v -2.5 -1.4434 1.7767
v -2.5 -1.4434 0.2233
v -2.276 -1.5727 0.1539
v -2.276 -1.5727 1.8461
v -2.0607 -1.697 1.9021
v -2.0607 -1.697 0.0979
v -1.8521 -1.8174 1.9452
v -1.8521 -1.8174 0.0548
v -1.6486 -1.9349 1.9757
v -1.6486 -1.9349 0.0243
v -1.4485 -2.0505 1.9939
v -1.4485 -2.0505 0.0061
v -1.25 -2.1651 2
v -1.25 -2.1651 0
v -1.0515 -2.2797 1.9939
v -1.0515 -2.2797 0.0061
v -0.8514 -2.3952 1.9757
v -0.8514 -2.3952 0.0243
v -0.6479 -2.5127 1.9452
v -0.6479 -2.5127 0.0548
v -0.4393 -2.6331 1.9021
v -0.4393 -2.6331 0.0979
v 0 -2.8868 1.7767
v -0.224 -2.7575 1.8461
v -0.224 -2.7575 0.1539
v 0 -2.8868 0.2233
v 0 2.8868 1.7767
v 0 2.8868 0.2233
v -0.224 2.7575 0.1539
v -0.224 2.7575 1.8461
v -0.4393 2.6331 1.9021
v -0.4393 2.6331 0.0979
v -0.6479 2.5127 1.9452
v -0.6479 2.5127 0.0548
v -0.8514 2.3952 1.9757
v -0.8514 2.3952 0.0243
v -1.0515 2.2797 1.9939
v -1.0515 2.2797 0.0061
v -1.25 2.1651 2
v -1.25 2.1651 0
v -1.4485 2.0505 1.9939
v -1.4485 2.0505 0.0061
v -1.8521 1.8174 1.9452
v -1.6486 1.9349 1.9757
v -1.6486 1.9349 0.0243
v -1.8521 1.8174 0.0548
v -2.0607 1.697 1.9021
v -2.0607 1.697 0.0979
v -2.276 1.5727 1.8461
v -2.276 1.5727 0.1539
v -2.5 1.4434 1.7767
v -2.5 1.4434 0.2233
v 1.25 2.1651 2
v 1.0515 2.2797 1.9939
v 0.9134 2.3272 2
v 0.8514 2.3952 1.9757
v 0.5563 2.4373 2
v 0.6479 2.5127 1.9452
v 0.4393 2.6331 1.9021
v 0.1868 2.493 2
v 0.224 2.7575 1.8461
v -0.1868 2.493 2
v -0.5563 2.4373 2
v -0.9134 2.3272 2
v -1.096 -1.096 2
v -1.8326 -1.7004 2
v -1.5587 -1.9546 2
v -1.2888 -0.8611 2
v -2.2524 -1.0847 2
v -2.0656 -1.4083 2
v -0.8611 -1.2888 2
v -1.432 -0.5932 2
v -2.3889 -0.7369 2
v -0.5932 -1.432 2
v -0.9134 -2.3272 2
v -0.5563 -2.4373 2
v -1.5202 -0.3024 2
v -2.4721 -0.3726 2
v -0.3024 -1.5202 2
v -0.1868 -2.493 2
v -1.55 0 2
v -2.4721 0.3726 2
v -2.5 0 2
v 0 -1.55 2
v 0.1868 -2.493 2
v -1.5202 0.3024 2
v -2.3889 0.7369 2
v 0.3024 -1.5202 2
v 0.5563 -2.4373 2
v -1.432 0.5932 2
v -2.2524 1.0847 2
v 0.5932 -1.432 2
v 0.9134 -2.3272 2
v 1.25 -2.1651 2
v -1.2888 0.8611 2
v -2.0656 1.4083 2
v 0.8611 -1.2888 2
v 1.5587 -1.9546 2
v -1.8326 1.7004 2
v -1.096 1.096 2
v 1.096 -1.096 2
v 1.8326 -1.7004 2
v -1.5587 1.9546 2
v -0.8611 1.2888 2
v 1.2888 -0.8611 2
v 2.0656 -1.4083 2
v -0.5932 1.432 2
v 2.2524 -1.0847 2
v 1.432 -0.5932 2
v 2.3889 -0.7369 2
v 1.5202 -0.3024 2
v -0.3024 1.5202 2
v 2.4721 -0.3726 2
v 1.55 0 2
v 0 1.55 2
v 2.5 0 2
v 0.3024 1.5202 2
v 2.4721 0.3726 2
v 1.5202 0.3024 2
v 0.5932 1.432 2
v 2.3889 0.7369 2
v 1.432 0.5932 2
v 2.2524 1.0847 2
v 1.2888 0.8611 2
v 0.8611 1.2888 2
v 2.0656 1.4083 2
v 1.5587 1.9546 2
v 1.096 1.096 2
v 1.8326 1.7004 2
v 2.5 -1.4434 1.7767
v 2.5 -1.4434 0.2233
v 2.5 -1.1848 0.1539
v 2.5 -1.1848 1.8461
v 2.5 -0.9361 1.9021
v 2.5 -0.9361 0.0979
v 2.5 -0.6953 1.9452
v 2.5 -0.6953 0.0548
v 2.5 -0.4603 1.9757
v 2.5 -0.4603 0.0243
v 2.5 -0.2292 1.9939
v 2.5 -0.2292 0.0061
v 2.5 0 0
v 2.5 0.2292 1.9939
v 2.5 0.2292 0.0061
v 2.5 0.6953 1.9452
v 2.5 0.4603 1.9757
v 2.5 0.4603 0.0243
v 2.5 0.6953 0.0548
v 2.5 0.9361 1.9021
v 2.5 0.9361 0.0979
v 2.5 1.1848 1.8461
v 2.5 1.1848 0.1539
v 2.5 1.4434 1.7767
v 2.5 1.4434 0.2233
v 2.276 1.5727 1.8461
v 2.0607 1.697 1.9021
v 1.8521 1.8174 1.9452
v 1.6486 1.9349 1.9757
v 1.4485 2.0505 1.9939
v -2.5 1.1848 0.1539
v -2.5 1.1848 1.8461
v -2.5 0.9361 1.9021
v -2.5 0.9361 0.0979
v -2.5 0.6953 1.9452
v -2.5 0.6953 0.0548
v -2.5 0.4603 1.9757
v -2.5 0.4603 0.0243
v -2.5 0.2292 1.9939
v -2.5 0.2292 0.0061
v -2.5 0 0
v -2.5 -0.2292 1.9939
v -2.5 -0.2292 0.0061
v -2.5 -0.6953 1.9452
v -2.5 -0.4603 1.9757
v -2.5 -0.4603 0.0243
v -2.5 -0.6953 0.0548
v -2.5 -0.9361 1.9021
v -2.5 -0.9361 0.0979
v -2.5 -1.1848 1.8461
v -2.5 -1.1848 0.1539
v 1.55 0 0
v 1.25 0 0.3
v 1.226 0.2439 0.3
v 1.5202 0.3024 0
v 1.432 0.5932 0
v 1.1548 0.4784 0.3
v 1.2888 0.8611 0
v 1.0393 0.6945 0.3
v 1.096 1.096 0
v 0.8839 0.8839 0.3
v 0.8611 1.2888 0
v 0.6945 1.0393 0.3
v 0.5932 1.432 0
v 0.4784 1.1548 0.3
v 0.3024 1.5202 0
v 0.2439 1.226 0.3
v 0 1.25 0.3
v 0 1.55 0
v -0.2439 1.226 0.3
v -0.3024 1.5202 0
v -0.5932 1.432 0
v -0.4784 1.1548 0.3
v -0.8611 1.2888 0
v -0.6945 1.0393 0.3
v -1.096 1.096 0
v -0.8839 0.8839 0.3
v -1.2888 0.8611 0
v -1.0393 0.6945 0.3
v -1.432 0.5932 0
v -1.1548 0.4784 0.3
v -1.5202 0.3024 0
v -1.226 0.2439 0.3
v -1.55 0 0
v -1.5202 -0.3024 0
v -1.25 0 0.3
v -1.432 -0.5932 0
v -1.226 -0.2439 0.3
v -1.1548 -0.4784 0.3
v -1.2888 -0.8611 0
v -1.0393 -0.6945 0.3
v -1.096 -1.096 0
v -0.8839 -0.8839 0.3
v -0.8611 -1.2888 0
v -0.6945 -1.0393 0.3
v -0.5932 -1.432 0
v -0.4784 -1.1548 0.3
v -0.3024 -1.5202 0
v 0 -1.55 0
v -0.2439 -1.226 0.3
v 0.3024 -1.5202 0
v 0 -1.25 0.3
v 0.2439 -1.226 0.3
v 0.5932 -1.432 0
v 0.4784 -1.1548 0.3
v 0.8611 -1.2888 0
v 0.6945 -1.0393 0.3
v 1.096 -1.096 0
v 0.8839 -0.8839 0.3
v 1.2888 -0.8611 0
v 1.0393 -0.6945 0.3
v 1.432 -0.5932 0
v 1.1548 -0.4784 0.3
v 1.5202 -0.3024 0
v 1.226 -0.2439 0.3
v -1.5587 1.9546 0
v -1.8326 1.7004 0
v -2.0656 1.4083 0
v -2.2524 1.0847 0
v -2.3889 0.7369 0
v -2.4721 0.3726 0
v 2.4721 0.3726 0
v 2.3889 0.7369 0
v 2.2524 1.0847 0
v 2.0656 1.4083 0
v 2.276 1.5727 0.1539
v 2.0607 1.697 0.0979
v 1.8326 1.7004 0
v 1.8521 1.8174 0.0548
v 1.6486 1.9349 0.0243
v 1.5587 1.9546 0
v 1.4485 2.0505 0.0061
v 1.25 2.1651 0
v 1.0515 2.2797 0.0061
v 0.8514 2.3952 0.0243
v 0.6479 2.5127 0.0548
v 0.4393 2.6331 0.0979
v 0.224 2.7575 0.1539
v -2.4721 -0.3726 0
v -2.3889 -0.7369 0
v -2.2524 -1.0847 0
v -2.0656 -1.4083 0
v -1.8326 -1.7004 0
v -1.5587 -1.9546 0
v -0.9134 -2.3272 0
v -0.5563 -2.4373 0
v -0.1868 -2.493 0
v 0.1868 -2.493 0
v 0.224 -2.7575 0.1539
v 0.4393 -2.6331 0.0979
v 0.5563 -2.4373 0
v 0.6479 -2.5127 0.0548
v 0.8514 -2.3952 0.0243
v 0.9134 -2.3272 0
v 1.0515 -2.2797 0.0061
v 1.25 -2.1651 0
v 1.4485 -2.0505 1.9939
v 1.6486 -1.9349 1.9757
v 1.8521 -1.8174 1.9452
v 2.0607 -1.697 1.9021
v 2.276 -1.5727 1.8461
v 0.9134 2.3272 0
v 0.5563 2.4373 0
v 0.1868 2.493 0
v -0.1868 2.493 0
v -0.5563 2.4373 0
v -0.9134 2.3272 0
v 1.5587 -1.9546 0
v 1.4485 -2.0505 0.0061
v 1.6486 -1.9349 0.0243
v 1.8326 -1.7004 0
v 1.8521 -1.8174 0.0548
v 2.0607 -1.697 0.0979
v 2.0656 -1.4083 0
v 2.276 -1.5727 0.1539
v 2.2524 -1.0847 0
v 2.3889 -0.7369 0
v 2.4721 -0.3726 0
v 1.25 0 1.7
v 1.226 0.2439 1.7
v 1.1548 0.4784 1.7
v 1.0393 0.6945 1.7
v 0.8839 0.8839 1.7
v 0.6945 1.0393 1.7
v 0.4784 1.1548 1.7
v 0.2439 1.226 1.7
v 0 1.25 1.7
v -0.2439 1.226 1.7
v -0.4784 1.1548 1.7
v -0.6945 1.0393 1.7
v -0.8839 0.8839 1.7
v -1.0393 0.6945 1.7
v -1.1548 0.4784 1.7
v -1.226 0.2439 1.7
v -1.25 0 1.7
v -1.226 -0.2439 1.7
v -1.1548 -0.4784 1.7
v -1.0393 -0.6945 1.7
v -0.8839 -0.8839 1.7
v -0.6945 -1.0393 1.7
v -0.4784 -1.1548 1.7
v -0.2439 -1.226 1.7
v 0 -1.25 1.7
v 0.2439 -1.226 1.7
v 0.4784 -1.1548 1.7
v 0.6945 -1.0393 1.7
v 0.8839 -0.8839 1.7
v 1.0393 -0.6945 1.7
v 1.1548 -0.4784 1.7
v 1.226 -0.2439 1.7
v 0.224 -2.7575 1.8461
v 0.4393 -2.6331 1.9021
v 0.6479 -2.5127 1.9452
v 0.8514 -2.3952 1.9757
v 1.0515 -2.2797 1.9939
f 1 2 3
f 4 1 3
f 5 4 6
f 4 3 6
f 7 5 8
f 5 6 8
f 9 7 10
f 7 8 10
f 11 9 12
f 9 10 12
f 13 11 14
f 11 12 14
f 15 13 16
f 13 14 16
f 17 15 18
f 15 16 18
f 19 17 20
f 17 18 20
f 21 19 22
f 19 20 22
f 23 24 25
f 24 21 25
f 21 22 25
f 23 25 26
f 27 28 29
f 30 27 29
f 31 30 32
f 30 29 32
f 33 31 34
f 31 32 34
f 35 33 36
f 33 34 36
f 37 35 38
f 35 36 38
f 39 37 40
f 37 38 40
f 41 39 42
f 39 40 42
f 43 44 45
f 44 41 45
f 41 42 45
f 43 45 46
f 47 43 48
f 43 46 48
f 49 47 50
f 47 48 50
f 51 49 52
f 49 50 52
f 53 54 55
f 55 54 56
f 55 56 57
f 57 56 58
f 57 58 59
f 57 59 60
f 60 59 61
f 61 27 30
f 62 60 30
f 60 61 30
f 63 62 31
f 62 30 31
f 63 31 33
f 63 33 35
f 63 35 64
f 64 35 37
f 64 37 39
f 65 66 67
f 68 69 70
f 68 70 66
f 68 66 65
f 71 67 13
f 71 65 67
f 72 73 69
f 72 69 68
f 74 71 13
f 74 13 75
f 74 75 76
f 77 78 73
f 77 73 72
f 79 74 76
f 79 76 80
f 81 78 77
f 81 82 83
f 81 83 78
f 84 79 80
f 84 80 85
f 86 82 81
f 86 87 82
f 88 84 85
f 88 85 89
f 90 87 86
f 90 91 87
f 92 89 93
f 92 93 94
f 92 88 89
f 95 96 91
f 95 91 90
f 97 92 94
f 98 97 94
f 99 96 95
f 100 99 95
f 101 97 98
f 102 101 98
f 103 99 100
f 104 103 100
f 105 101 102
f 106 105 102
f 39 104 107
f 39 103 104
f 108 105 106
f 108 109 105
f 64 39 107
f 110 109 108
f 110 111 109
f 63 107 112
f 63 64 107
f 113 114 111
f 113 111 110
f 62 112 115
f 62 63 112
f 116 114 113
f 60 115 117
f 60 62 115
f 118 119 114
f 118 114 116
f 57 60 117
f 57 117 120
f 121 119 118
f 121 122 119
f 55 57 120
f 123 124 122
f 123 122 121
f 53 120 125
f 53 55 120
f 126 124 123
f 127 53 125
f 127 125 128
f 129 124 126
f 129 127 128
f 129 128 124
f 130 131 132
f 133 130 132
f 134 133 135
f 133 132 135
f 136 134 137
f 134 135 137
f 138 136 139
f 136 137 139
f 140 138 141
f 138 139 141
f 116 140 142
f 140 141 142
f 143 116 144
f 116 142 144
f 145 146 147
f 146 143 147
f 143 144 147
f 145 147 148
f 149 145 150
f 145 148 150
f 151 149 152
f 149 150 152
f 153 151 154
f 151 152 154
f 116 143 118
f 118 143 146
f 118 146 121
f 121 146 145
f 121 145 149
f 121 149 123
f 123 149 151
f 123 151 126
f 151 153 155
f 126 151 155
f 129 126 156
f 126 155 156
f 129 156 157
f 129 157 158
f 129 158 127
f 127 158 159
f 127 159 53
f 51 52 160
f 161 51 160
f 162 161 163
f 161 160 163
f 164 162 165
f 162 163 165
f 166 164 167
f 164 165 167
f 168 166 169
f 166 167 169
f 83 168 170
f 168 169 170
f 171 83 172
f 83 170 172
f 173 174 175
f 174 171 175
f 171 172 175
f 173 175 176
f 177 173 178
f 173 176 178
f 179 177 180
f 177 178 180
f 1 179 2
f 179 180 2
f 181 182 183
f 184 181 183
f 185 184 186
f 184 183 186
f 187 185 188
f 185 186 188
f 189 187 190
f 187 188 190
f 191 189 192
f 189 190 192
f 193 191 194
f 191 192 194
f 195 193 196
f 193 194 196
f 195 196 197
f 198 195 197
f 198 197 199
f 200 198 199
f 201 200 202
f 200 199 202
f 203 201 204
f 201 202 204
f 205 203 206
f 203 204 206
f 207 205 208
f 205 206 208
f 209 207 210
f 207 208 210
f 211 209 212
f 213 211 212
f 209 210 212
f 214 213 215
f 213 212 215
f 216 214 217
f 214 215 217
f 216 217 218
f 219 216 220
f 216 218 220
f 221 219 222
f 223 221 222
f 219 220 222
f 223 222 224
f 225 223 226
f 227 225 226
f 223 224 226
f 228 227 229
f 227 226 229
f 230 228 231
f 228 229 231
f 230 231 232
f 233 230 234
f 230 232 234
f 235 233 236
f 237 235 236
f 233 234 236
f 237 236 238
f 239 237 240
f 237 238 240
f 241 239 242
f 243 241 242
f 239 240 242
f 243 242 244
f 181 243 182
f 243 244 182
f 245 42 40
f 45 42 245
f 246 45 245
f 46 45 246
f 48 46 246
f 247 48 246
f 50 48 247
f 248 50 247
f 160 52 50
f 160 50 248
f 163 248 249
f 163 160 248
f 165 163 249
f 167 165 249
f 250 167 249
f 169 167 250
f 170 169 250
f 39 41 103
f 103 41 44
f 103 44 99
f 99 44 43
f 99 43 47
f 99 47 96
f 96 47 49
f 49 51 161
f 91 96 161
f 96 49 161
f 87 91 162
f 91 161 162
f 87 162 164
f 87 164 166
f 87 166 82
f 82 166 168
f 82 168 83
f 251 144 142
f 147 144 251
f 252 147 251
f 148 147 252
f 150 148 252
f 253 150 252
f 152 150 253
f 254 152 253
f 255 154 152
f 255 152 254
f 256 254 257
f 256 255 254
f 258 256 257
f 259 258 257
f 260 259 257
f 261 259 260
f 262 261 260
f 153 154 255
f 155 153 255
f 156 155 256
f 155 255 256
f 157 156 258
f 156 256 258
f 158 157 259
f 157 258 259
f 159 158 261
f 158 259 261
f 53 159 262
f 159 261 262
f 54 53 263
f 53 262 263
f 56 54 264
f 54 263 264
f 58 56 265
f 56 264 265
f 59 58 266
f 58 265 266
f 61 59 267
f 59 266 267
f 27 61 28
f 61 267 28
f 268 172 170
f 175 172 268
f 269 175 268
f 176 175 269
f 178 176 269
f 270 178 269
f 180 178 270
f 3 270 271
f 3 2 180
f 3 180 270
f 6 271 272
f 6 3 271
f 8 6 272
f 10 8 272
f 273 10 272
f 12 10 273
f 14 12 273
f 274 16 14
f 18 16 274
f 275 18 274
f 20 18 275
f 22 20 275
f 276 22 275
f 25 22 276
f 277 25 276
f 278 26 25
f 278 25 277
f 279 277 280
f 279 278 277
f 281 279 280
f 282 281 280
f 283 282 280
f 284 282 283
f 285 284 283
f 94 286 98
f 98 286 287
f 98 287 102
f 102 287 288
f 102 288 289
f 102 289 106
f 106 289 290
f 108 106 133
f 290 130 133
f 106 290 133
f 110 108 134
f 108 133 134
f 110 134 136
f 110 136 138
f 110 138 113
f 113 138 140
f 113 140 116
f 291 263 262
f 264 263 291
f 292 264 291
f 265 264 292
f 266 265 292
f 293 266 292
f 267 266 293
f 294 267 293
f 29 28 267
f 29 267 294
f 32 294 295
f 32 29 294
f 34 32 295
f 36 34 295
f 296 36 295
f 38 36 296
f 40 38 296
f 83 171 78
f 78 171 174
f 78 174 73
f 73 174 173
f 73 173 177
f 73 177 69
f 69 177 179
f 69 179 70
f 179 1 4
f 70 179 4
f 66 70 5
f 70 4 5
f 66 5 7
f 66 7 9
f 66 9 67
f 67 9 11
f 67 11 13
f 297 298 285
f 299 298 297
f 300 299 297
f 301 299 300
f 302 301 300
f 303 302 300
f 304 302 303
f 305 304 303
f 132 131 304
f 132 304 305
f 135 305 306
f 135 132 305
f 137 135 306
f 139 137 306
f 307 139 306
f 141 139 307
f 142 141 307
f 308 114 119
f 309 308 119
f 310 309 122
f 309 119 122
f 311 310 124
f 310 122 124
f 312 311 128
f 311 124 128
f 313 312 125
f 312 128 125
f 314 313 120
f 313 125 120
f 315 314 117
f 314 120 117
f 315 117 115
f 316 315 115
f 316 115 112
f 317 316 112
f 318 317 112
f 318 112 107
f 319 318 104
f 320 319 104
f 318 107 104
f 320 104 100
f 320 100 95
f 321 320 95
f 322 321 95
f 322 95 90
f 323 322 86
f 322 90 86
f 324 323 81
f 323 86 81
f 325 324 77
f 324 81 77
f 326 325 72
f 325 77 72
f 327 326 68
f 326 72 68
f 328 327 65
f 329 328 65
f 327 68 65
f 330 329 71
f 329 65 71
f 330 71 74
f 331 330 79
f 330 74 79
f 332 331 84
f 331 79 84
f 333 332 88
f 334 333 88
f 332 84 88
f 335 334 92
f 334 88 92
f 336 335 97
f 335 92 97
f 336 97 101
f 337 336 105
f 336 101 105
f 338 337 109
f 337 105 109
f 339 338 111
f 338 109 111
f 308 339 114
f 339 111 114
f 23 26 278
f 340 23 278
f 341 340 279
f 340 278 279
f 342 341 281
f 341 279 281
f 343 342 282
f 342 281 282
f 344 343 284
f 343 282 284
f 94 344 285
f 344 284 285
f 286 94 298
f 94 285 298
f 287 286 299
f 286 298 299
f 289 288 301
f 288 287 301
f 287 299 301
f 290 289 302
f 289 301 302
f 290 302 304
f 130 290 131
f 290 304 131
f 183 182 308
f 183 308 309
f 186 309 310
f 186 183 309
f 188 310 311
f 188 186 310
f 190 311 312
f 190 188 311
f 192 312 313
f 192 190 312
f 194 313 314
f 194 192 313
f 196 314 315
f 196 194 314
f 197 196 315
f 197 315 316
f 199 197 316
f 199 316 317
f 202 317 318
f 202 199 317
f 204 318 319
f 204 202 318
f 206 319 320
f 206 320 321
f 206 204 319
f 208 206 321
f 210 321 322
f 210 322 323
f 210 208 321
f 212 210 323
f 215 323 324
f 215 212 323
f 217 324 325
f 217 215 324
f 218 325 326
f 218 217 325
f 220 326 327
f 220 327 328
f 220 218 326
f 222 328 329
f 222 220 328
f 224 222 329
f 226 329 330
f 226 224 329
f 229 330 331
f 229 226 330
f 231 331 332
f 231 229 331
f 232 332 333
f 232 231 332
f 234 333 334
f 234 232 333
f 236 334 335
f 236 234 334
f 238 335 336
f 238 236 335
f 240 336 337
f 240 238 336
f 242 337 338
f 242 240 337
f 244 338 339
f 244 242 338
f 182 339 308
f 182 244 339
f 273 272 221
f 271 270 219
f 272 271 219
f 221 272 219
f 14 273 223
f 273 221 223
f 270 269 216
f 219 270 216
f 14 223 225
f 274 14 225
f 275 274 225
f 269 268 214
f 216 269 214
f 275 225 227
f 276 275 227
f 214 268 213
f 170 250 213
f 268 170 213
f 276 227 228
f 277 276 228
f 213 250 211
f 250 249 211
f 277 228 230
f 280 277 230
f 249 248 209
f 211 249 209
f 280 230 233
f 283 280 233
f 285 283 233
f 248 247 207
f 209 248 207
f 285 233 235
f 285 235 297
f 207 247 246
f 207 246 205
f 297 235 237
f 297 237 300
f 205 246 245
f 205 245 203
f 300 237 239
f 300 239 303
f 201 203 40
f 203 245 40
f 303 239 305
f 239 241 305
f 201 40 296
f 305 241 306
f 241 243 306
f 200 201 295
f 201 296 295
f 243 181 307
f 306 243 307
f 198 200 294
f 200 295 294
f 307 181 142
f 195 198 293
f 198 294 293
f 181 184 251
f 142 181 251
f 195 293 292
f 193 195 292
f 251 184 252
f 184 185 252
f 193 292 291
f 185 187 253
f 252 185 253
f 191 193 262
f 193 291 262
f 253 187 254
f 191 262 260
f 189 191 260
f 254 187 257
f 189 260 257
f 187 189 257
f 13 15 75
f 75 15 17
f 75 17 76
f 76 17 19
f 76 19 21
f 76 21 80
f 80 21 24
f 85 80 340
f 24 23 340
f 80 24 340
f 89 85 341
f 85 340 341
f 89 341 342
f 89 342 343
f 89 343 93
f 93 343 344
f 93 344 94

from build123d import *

# Parameters (mm, degrees)
SKETCH1_R           = 3.5
SKETCH1_R_2         = 1.25
BOSS_EXTRUDE1_DEPTH = 2
CHAMFER1_SIZE       = 1
CHAMFER1_SIZE2      = 0.577350269
CHAMFER2_SIZE       = 1
CHAMFER2_SIZE2      = 0.577350269
SKETCH1_3_R         = 3.5
CUT_EXTRUDE1_DEPTH  = 6.338539126
CHAMFER3_SIZE       = 0.3


with BuildPart() as part:
    # Sketch1 → Boss-Extrude1 (new body)
    with BuildSketch(Plane.XY):
        Circle(SKETCH1_R)
        Circle(SKETCH1_R_2, mode=Mode.SUBTRACT)
    extrude(amount=BOSS_EXTRUDE1_DEPTH)

    # Chamfer1
    chamfer1_edges = [part.edges().sort_by_distance(p)[0] for p in [
        (-3.5, 0, 2),
    ]]
    chamfer1_side = [part.faces().sort_by_distance(p)[0] for p in [
        (-3.401005051, 0, 2),
    ]]
    chamfer(chamfer1_edges, length=CHAMFER1_SIZE, length2=CHAMFER1_SIZE2, reference=chamfer1_side[0])

    # Chamfer2
    chamfer2_edges = [part.edges().sort_by_distance(p)[0] for p in [
        (-3.5, 0, 0),
    ]]
    chamfer2_side = [part.faces().sort_by_distance(p)[0] for p in [
        (-3.401005051, 0, 0),
    ]]
    chamfer(chamfer2_edges, length=CHAMFER2_SIZE, length2=CHAMFER2_SIZE2, reference=chamfer2_side[0])

    # Sketch1<3> → Cut-Extrude1 (cut, through all)
    with BuildSketch(Plane.XY):
        Circle(SKETCH1_3_R)
        Polygon((-2.5, 1.443375673), (0, 2.886751346), (2.5, 1.443375673), (2.5, -1.443375673), (0, -2.886751346), (-2.5, -1.443375673), align=None, mode=Mode.SUBTRACT)
    extrude(amount=CUT_EXTRUDE1_DEPTH, mode=Mode.SUBTRACT)

    # Chamfer3
    chamfer3_edges = [part.edges().sort_by_distance(p)[0] for p in [
        (-1.25, 0, 0),
        (-1.25, 0, 2),
    ]]
    chamfer(chamfer3_edges, length=CHAMFER3_SIZE)


solid = part.part
